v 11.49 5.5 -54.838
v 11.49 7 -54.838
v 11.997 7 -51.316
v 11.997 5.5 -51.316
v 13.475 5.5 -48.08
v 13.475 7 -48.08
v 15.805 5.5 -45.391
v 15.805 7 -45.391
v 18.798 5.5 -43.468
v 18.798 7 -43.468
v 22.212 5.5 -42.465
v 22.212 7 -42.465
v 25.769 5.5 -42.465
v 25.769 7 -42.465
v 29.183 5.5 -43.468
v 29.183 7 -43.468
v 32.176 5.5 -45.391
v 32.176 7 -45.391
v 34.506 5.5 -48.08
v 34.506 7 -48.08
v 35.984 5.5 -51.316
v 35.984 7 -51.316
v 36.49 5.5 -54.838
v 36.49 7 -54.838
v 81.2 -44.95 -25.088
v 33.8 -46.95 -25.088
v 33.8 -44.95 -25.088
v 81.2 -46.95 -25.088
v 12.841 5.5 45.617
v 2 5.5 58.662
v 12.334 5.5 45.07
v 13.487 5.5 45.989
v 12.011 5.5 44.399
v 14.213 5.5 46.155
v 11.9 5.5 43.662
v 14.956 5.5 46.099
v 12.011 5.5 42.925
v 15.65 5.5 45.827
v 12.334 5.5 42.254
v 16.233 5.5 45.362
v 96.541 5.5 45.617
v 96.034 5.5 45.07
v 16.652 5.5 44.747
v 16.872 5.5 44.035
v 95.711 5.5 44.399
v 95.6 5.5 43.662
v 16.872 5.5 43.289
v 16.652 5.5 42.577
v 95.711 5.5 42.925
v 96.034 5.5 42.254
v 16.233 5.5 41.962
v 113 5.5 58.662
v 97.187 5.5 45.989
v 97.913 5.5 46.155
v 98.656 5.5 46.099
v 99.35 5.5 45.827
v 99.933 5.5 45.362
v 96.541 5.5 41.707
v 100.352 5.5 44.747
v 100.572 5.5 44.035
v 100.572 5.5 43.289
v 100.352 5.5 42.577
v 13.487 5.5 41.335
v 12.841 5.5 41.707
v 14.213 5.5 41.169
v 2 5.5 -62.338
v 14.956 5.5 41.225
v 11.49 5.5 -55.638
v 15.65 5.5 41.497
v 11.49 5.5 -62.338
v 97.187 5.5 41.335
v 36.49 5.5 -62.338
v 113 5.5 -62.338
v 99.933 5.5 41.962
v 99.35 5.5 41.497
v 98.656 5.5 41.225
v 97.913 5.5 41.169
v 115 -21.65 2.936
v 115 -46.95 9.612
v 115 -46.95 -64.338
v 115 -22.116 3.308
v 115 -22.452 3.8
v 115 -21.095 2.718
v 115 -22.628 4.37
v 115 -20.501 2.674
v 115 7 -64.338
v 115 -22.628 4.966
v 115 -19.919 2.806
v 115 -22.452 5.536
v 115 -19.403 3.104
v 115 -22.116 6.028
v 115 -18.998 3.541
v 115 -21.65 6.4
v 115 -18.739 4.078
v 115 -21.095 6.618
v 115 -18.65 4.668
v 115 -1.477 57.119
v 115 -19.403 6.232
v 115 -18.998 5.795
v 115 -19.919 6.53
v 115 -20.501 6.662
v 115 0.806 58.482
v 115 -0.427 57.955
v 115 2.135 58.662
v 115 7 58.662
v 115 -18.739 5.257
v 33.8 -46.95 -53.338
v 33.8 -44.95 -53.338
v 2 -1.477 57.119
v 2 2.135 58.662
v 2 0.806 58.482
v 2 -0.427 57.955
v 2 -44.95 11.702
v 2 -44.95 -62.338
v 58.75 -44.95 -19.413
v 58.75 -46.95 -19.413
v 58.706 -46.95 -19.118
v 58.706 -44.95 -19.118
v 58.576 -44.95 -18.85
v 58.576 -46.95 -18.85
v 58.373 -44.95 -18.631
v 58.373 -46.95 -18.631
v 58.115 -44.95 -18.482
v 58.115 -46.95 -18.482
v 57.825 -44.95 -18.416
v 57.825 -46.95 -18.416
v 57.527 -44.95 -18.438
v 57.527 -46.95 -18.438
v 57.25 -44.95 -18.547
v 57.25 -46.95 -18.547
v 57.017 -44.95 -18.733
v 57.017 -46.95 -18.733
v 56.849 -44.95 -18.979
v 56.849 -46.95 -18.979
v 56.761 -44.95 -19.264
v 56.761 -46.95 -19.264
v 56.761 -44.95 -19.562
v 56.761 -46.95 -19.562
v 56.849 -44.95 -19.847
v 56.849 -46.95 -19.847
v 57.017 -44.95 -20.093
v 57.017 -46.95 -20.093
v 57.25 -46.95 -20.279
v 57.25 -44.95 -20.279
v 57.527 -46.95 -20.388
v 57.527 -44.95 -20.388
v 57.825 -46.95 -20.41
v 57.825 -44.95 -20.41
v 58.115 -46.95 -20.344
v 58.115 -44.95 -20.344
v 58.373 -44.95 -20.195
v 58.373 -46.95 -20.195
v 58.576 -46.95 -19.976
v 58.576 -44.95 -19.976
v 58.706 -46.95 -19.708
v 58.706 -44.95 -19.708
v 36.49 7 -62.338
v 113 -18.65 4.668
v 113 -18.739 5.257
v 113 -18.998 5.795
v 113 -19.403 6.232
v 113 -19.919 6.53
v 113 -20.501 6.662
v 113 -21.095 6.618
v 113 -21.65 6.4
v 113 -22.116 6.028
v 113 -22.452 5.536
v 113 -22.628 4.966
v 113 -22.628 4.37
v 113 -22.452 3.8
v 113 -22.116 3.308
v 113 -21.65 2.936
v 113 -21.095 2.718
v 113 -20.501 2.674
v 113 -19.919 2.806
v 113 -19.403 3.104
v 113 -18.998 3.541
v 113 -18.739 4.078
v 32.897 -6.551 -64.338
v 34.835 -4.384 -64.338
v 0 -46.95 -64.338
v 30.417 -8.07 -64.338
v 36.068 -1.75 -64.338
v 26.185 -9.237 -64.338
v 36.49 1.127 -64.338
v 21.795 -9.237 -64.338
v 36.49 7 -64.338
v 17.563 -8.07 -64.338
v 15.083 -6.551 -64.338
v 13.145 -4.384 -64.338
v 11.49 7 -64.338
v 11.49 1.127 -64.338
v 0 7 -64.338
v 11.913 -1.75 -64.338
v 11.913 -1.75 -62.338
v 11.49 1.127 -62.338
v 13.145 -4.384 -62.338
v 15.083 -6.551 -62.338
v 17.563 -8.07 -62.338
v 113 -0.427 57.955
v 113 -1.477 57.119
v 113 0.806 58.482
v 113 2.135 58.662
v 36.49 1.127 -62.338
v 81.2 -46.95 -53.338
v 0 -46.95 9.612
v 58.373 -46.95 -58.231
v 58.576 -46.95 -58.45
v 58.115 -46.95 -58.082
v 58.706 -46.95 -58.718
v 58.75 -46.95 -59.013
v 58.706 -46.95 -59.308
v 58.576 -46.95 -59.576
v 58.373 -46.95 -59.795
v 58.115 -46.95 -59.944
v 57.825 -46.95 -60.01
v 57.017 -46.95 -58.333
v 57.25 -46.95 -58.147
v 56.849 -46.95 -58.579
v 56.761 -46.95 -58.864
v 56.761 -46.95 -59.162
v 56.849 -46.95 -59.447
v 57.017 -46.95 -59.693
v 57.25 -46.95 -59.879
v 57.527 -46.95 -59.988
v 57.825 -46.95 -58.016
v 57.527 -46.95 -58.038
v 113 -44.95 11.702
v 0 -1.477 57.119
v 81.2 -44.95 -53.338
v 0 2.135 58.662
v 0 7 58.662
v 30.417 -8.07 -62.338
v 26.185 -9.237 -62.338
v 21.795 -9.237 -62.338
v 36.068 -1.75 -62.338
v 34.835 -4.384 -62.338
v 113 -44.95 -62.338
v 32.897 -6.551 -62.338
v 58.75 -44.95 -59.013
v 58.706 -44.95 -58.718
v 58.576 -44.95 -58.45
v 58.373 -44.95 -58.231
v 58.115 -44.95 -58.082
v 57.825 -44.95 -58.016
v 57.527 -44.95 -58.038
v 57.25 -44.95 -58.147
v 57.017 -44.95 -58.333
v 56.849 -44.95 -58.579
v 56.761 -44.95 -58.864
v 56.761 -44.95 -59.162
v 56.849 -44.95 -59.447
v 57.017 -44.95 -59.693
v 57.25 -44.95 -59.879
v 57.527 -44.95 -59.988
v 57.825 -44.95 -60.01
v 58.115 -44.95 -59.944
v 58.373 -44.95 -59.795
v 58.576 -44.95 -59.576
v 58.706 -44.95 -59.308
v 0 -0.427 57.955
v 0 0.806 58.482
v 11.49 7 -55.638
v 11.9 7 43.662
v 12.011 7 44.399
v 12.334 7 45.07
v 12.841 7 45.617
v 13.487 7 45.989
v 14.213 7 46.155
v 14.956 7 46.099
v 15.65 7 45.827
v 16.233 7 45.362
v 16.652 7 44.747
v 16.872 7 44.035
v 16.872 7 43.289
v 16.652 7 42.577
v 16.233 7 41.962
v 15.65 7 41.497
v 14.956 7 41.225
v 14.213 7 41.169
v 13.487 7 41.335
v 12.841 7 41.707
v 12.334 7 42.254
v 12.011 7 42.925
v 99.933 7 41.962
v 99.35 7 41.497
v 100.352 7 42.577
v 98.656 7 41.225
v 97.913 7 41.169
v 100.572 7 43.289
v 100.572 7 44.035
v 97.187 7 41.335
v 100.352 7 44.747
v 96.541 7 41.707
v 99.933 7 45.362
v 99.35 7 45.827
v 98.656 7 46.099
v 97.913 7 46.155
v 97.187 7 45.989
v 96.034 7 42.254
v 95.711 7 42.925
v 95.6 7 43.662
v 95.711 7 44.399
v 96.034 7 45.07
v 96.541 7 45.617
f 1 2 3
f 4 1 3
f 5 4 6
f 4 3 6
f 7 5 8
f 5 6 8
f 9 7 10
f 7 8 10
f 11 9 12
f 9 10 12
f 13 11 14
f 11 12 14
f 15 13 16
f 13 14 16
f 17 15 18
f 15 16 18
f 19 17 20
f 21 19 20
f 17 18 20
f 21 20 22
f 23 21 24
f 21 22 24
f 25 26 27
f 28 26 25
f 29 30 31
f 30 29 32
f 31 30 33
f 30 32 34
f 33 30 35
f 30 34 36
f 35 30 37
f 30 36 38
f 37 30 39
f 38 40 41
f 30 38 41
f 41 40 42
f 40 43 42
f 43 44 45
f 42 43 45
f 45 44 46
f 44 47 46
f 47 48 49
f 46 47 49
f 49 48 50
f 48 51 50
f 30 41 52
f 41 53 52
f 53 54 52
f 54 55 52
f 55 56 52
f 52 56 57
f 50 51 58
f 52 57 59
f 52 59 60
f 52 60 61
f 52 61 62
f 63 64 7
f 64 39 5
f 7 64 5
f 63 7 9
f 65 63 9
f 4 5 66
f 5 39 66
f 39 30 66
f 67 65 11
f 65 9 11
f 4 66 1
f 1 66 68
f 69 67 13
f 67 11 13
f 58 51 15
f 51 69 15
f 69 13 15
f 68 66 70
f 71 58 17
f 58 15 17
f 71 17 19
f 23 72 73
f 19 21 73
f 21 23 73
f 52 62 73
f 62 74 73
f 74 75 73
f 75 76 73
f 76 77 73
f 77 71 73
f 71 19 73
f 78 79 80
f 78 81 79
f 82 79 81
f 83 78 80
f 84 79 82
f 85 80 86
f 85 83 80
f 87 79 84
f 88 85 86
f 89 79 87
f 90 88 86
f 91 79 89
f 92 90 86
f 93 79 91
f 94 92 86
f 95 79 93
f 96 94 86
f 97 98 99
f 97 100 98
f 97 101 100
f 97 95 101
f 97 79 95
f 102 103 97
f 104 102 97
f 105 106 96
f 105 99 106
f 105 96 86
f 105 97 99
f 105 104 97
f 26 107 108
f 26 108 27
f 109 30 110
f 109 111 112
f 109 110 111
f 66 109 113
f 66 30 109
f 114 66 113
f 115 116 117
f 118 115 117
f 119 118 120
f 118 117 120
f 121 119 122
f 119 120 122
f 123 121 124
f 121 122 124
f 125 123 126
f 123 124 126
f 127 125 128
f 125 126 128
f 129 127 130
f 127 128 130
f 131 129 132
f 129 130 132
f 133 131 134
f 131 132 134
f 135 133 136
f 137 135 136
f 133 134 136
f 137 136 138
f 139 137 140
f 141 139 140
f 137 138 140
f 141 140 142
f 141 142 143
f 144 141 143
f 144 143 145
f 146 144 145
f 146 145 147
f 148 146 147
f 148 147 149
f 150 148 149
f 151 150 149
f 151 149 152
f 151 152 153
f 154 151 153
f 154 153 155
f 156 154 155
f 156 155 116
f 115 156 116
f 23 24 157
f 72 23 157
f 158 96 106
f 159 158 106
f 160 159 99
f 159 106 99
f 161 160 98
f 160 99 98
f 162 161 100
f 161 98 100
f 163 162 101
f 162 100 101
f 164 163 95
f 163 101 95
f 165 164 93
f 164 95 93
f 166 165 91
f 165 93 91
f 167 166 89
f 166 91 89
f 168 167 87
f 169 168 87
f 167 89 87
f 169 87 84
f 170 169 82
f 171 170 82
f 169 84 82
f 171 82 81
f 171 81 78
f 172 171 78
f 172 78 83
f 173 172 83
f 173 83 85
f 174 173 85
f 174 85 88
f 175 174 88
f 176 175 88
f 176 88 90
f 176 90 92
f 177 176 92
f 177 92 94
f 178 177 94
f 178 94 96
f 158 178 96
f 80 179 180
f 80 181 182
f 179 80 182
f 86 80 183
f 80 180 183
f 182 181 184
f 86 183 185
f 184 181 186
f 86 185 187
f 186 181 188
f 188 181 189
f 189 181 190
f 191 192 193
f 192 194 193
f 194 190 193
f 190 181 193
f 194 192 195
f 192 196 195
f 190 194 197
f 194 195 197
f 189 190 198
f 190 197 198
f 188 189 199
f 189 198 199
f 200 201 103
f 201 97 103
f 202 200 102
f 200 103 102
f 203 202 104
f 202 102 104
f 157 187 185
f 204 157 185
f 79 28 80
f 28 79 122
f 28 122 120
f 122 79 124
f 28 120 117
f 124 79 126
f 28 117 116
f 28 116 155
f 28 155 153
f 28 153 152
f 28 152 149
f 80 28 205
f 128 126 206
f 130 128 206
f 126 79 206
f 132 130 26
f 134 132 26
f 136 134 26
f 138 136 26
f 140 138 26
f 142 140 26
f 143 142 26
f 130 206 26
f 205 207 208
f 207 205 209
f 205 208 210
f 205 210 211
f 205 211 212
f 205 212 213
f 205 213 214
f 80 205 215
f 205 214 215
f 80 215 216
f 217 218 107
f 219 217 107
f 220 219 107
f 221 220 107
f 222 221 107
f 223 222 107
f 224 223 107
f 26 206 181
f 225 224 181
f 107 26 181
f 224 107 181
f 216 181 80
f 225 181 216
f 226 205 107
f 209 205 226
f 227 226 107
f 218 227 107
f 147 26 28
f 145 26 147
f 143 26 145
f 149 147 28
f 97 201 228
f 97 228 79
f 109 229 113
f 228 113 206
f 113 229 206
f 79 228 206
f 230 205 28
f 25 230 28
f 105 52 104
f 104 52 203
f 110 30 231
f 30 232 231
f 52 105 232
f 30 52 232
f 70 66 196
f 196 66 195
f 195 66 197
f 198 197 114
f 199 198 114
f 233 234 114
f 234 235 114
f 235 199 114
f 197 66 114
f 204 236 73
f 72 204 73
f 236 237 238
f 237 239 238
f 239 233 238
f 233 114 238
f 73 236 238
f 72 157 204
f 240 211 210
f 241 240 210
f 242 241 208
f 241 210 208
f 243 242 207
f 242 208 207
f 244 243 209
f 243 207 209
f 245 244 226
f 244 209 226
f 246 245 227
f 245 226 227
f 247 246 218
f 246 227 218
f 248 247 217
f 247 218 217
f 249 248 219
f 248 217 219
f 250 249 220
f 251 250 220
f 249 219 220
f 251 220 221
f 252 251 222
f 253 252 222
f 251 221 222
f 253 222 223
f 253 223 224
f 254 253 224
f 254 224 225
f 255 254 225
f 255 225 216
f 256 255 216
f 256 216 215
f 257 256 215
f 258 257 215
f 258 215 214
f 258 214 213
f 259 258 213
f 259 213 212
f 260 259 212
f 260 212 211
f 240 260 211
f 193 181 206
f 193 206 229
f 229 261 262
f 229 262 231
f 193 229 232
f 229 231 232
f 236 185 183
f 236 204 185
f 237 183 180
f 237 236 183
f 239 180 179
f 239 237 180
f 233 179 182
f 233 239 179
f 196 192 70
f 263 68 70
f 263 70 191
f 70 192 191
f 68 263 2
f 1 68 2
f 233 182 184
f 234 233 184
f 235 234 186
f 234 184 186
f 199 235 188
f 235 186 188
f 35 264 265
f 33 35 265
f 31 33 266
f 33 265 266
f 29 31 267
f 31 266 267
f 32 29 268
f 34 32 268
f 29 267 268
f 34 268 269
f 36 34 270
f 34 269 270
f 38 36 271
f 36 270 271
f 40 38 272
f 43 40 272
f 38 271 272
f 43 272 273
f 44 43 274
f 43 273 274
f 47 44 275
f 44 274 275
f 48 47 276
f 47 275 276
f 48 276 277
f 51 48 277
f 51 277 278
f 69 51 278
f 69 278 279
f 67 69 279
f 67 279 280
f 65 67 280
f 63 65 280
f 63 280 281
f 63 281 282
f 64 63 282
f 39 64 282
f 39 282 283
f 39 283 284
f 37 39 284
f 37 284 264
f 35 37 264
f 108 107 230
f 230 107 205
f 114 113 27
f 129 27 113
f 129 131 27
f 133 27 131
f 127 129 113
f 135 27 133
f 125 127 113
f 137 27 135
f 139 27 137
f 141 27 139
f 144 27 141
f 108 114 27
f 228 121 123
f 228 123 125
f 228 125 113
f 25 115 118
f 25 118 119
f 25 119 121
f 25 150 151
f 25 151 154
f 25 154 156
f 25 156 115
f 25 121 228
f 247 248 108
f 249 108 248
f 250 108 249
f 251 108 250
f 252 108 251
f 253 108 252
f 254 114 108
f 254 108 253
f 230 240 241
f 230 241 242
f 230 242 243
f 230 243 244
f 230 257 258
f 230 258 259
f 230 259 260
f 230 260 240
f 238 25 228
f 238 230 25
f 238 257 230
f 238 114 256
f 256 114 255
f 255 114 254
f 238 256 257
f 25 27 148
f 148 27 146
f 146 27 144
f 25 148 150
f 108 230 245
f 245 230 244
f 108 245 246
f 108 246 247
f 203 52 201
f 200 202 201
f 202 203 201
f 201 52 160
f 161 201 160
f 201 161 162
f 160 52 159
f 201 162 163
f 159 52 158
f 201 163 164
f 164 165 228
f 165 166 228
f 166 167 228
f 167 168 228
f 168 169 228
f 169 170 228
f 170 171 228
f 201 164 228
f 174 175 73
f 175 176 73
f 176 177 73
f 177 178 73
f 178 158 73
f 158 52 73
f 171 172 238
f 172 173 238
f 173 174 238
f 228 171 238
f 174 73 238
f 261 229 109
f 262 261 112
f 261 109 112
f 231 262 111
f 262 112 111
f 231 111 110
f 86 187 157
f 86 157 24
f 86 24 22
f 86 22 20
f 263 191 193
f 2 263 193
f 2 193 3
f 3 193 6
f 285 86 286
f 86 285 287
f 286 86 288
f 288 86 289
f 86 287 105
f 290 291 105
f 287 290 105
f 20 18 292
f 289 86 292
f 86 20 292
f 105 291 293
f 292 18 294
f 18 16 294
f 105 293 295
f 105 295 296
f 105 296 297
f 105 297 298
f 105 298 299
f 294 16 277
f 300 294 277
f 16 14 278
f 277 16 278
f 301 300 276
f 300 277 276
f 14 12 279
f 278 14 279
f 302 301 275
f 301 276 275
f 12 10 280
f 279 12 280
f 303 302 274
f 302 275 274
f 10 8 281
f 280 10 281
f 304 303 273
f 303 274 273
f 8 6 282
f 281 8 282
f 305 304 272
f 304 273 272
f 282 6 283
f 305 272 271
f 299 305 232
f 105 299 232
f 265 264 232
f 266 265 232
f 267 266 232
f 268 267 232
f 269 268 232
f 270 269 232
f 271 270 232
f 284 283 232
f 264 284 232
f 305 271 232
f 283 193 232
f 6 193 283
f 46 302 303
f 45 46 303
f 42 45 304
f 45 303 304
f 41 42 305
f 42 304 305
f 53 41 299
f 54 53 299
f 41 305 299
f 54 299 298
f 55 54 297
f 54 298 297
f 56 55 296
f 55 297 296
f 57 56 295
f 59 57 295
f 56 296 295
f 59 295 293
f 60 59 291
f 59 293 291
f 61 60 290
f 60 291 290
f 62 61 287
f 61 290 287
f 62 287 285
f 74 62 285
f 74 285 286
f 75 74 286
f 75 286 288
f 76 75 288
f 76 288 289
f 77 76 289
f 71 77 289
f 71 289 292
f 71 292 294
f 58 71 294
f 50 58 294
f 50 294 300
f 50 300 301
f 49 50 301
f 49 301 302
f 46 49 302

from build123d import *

# Parameters (mm, degrees)
F1_DEPTH  = 115
F3_START  = -2
F2_W      = 111
F2_H      = 50.45
F3_DEPTH  = 173.4
F4_W      = 47.4
F4_H      = 28.25
F4_R      = 1
F5_DEPTH  = 25
F7_DEPTH  = 2
F8_R      = 2.5
F9_DEPTH  = 5.7
F10_R     = 2
F11_DEPTH = 25
F12_R     = 5
F14_DEPTH = 8.7
F15_R     = 10


with BuildPart() as f1:
    # F0 (on Right) → F1 (new body)
    with BuildSketch(Plane.YZ):
        Polygon((-46.95, 9.6120529463), (-46.95, -64.3379470537), (7, -64.3379470537), (7, 30.95759285), (7, 58.6620529463), (0, 58.6620529463), align=None)
    extrude(amount=F1_DEPTH)

    # F2 (on face) → F3 (cut)
    with BuildSketch(Plane(origin=(0, 0, -64.3379470537), x_dir=(1, 0, 0), z_dir=(0, 0, -1)).offset(F3_START)):
        with Locations((57.5, 19.725)):
            Rectangle(F2_W, F2_H)
    extrude(amount=-F3_DEPTH, mode=Mode.SUBTRACT)

    # F4 (on face) → F5 (cut)
    with BuildSketch(Plane.XZ.offset(46.95)):
        with Locations((57.5, -39.2129470537)):
            Rectangle(F4_W, F4_H)
        with Locations((57.75, -19.4129470537)):
            Circle(F4_R)
        with Locations((57.75, -59.0129470537)):
            Circle(F4_R)
    extrude(amount=-F5_DEPTH, mode=Mode.SUBTRACT)

    # F6 (on face) → F7 (cut)
    with BuildSketch(Plane(origin=(0, 7, 0), x_dir=(-1, 0, 0), z_dir=(0, 1, 0))):
        with BuildLine():
            Line((-36.4904825576, -54.8379470537), (-36.4904825576, -62.3379470537))
            Line((-36.4904825576, -62.3379470537), (-11.4904825576, -62.3379470537))
            Line((-11.4904825576, -62.3379470537), (-11.4904825576, -54.8379470537))
            ThreePointArc((-11.4904825576, -54.8379470537), (-23.9904825576, -42.3379470537), (-36.4904825576, -54.8379470537))
        make_face()
    extrude(amount=-F7_DEPTH, mode=Mode.SUBTRACT)

    # F8 (on face) → F9 (cut)
    with BuildSketch(Plane(origin=(0, 7, 0), x_dir=(-1, 0, 0), z_dir=(0, 1, 0))):
        with Locations((-98.1, 43.6620529463)):
            Circle(F8_R)
        with Locations((-14.4, 43.6620529463)):
            Circle(F8_R)
    extrude(amount=-F9_DEPTH, mode=Mode.SUBTRACT)

    # F10 (on face) → F11 (cut)
    with BuildSketch(Plane.YZ.offset(115)):
        with Locations((-20.65, 4.6679739505)):
            Circle(F10_R)
    extrude(amount=-F11_DEPTH, mode=Mode.SUBTRACT)

    # F12
    f12_edges = [f1.edges().sort_by_distance(p)[0] for p in [
        (1, 0, 58.662053),
        (114, 0, 58.662053),
    ]]
    fillet(f12_edges, radius=F12_R)

    # F13 (on face) → F14 (cut)
    with BuildSketch(Plane(origin=(0, 0, -64.3379470537), x_dir=(1, 0, 0), z_dir=(0, 0, -1))):
        with BuildLine():
            Line((11.490044184, 3.5827266984), (11.490044184, -7))
            Line((11.490044184, -7), (36.4903211594, -7))
            Line((36.4903211594, -7), (36.4903211594, 3.5827266984))
            ThreePointArc((36.4903211594, 3.5827266984), (23.9901826717, 9.3848176292), (11.490044184, 3.5827266984))
        make_face()
    extrude(amount=-F14_DEPTH, mode=Mode.SUBTRACT)

    # F15
    f15_edges = [f1.edges().sort_by_distance(p)[0] for p in [
        (36.490321, -3.582727, -63.337947),
        (11.490044, -3.582727, -63.337947),
    ]]
    fillet(f15_edges, radius=F15_R)


solid = f1.part
